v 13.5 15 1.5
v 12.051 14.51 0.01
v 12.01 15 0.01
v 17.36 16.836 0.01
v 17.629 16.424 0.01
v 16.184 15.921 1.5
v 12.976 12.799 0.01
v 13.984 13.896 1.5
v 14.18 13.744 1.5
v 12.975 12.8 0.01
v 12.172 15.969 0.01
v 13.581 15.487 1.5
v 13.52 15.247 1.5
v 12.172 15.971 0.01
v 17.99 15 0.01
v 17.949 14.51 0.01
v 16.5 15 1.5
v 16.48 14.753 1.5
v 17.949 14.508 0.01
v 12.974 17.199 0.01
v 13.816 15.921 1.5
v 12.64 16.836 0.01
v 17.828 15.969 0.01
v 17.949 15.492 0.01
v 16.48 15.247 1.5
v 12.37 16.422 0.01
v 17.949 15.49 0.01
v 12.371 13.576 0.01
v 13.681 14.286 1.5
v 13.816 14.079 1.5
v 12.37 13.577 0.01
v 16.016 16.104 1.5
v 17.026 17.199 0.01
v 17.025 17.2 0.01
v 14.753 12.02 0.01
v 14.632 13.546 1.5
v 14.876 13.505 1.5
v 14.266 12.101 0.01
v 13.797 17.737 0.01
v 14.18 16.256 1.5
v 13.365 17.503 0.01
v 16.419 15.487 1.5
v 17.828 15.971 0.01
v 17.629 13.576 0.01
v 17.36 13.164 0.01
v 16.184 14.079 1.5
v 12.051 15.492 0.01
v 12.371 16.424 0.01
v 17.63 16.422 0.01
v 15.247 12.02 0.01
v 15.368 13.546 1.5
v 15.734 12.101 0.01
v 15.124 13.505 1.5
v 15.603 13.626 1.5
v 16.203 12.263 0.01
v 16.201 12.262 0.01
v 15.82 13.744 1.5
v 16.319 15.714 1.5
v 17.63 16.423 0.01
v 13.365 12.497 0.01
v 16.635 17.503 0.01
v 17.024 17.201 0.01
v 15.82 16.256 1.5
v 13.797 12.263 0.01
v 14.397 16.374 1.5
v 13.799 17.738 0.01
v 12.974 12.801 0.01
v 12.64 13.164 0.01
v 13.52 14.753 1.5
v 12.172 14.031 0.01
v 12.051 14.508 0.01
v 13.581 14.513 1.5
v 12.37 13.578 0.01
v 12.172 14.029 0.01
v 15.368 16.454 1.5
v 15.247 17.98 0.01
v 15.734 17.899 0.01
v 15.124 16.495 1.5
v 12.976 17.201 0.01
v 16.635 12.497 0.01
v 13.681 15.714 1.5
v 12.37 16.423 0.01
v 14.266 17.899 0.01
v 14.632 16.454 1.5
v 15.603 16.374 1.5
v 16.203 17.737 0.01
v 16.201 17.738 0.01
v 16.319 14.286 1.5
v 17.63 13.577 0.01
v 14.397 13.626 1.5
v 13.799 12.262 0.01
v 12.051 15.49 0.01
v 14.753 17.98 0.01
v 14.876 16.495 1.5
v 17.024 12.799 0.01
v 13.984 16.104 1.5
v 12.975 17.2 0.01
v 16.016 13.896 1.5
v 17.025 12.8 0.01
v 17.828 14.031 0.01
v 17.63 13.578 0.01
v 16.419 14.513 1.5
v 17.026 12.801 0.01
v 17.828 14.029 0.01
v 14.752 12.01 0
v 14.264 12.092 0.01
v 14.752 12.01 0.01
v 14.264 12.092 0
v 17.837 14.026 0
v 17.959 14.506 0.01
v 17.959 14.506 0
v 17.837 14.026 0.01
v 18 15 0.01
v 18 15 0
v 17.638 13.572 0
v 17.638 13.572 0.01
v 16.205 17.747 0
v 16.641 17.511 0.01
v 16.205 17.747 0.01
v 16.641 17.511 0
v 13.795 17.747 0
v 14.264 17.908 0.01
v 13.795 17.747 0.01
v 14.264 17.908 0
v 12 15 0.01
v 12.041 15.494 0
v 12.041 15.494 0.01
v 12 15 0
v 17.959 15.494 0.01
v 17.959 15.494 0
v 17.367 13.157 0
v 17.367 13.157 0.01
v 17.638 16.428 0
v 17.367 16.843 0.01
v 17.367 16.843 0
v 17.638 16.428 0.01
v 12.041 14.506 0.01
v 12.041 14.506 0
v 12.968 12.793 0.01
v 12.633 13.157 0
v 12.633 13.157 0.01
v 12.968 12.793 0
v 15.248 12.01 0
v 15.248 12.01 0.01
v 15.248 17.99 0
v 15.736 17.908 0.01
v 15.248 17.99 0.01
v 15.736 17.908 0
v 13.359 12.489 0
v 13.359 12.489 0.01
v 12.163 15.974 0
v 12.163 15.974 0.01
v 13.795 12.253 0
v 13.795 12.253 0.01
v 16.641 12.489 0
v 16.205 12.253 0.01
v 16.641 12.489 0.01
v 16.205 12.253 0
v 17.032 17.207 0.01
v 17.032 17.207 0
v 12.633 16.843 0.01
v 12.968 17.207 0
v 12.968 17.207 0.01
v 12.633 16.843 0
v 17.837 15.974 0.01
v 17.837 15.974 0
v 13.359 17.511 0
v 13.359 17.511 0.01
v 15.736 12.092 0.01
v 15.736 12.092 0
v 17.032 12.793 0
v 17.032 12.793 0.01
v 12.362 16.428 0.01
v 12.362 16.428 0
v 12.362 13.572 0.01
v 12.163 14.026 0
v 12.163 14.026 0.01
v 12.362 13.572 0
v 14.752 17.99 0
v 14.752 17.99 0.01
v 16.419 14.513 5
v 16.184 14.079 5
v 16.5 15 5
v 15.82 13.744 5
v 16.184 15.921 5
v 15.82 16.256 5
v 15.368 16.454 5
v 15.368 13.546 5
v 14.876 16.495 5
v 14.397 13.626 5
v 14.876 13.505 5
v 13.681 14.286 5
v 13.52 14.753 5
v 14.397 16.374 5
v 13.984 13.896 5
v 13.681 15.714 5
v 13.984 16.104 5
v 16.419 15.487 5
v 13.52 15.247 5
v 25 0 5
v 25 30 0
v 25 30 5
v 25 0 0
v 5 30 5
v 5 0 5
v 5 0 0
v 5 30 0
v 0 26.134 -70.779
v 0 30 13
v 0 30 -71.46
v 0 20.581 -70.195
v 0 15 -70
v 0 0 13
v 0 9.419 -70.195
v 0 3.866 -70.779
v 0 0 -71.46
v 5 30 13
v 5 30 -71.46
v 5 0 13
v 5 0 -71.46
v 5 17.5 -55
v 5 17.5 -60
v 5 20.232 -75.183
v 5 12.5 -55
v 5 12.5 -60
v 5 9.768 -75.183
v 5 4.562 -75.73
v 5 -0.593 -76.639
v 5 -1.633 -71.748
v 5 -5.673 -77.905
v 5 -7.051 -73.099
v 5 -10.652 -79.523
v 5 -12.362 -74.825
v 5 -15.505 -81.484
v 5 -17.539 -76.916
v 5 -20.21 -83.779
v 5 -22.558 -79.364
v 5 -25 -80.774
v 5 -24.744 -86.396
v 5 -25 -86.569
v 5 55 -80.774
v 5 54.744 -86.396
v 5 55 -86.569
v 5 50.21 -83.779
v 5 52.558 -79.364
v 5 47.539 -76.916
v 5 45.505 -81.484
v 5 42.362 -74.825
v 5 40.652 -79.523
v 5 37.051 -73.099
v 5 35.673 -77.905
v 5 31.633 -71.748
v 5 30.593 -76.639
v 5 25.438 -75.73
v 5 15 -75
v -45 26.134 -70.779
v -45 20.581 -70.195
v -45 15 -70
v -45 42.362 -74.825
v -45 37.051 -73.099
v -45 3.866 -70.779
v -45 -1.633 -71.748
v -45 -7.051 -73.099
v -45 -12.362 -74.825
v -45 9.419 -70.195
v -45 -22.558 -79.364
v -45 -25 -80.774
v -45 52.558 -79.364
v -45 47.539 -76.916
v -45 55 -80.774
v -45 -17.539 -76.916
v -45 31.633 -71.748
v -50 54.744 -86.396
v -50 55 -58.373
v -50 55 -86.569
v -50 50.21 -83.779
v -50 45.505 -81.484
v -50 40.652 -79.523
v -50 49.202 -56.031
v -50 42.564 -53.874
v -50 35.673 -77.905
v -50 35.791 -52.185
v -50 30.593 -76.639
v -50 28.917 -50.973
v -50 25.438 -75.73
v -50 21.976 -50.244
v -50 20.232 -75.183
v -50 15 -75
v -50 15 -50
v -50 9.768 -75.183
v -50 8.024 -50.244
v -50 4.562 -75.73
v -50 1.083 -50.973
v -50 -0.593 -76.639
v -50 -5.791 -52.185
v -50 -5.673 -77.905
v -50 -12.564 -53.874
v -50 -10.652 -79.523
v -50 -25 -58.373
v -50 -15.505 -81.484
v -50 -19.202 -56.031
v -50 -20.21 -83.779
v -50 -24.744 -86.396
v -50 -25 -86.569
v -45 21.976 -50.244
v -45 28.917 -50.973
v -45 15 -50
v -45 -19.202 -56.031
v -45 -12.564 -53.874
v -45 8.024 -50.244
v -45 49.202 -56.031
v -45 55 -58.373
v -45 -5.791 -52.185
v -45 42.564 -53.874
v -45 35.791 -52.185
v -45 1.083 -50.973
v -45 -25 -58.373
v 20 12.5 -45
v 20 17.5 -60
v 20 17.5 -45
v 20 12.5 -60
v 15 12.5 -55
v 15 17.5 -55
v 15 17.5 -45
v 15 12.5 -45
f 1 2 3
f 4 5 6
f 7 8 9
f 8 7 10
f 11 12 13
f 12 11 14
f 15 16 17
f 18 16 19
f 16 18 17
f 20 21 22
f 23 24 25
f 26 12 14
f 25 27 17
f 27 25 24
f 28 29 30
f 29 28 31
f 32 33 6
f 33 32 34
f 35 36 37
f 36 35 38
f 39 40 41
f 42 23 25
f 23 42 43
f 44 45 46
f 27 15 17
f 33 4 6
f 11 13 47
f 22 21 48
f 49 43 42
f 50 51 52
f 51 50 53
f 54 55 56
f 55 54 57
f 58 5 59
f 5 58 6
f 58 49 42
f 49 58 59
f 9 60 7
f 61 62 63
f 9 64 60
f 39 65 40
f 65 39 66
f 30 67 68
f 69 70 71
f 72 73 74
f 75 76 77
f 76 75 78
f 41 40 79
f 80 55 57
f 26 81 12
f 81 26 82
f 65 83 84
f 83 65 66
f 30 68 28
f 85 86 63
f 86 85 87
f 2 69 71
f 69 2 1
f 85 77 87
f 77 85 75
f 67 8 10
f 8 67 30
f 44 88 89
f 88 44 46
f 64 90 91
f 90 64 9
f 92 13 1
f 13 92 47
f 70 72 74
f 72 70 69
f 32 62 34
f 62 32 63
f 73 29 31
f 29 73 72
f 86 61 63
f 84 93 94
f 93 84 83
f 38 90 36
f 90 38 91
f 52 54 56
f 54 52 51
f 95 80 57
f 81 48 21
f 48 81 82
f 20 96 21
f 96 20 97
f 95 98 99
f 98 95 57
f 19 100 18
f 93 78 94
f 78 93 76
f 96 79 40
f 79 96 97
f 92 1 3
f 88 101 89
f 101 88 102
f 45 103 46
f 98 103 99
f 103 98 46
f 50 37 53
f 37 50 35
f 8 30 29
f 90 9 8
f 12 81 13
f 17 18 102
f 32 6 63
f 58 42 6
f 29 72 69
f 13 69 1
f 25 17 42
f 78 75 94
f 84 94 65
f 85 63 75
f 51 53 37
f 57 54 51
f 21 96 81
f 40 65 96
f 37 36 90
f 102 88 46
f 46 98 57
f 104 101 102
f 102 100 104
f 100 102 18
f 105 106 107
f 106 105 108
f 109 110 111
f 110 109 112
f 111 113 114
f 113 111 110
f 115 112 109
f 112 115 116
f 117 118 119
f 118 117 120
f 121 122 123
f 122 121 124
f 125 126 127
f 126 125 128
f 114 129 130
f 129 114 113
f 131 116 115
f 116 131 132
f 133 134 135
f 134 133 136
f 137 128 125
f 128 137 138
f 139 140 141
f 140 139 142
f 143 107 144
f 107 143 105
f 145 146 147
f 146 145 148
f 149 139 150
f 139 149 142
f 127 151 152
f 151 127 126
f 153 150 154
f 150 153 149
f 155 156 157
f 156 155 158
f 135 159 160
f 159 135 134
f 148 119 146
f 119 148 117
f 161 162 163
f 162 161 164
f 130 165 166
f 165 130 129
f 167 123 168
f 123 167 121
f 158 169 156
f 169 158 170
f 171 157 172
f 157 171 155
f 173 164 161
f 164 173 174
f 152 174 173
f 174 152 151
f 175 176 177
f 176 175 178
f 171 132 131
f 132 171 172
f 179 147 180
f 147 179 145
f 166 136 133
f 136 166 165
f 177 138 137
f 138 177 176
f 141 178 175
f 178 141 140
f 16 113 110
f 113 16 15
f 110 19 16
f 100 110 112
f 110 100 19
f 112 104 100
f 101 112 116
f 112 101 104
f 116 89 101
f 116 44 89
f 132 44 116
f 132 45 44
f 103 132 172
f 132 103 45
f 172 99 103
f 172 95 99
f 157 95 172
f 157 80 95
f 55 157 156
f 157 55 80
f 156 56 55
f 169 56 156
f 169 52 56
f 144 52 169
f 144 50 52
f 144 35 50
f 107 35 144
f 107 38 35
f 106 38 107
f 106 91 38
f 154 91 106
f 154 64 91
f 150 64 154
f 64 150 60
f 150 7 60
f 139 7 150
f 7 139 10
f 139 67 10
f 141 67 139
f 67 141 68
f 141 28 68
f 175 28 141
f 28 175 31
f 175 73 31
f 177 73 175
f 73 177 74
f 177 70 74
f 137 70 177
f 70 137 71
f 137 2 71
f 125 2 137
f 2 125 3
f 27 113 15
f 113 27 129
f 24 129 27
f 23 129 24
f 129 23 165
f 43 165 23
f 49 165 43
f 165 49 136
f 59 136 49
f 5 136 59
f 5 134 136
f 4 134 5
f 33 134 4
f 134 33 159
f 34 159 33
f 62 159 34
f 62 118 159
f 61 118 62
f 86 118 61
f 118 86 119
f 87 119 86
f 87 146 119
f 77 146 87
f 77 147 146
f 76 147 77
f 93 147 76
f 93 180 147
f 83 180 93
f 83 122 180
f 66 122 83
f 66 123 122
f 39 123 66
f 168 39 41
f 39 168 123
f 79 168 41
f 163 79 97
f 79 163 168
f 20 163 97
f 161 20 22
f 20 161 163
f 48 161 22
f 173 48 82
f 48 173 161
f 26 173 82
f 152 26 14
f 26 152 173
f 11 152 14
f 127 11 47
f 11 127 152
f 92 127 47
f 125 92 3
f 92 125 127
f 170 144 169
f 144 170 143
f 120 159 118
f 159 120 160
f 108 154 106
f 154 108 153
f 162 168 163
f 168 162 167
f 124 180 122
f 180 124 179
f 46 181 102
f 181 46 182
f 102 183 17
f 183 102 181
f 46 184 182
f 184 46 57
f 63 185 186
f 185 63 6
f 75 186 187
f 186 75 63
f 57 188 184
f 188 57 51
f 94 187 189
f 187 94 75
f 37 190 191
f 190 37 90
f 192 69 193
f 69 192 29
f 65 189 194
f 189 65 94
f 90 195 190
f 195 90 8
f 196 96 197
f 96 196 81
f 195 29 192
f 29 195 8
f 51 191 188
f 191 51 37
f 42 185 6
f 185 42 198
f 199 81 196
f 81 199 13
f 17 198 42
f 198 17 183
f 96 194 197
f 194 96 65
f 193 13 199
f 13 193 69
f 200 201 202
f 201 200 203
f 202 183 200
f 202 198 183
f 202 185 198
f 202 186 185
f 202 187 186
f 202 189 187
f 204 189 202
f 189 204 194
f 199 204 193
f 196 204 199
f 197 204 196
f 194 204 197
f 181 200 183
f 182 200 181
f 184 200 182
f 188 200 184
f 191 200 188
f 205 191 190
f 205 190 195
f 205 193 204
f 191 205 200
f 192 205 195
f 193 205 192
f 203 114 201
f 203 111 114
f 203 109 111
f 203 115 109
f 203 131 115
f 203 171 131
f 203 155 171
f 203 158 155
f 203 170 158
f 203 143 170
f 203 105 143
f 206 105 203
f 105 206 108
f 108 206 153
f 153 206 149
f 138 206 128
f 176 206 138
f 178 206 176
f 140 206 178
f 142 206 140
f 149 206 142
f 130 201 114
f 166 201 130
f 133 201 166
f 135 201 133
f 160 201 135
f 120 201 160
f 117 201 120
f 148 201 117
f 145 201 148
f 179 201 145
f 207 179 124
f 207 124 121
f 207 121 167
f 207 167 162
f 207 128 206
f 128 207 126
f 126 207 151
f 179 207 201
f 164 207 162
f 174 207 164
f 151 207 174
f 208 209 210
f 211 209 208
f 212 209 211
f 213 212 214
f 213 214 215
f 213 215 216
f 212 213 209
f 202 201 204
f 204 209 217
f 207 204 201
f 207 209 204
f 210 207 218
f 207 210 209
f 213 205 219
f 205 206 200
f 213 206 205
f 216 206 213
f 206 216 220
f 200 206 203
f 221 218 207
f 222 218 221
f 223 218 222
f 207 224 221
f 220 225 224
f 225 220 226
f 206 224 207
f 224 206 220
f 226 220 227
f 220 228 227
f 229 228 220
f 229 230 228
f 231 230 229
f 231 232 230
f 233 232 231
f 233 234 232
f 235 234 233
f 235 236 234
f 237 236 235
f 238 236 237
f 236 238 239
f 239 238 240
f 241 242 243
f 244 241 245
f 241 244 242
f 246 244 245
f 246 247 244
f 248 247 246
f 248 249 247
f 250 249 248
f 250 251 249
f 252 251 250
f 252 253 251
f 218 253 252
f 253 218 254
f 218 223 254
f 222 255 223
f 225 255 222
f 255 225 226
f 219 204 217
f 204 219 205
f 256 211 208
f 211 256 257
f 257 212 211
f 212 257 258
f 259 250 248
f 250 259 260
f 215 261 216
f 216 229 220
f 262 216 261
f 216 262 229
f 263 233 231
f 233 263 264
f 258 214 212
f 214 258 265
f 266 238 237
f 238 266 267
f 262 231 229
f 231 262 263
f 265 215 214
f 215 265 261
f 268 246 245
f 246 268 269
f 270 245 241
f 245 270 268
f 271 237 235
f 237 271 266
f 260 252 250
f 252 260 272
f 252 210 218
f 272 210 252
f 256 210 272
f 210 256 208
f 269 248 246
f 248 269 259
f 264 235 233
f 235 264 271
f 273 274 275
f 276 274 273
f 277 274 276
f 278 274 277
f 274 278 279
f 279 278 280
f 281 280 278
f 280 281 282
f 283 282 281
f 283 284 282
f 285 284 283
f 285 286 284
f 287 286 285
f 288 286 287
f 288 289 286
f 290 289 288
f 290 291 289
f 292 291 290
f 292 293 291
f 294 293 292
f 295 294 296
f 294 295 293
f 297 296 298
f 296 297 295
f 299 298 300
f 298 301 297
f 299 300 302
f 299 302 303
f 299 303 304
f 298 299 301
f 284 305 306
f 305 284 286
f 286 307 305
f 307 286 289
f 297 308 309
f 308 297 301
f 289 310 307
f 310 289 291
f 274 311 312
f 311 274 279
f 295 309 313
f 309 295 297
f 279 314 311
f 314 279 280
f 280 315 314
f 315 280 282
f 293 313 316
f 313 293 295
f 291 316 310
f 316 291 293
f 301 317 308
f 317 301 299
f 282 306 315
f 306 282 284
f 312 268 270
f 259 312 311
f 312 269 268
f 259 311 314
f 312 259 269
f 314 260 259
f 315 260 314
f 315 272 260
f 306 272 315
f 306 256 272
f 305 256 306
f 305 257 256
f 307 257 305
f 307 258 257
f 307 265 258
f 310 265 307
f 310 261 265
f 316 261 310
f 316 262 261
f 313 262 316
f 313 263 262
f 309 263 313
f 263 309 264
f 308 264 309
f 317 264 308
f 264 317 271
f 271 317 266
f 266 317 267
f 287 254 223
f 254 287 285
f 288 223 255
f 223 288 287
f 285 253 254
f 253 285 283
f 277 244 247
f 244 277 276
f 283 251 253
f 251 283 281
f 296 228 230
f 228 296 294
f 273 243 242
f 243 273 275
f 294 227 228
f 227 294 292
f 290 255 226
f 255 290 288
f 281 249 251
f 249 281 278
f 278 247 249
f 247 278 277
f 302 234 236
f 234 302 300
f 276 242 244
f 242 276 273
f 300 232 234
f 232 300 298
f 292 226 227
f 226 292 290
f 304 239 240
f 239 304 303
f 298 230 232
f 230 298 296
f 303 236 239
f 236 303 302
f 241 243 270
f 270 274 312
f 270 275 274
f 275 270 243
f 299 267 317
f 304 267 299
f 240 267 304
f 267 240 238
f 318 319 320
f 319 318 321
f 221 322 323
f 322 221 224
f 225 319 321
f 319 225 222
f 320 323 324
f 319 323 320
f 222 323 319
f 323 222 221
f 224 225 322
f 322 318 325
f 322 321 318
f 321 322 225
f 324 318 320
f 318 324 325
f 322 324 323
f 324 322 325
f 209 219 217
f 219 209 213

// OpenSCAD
thickness = 5;
width = 30;
length = 80;
alignerHeight = 8;
screwPlateWidth = 20;

armRadius = 75;
armWidth = 45;
armRailHeight = 20;
armBBWidth = 80;
armBBHeight = 50;

hookWidth = 10;
hookHeight = 10;

$fa = 4;
$fs = 0.5;  

module screwHole() {
    // 3.0 x 20 mm
    screwRadius = 1.5;
    screwHeadRadius = 3;
    screwHeadHeight = 1.5;
    
    length = 100;
    translate([0, 0, -screwHeadHeight])
        cylinder(screwHeadHeight, screwRadius, screwHeadRadius);
    translate([0, 0, -0.01])
        cylinder(length, screwHeadRadius, screwHeadRadius);
    cylinder(length, screwRadius, screwRadius, true);
}

difference() {    
    cube([thickness + screwPlateWidth, width, thickness]);
    translate([thickness + screwPlateWidth / 2, width / 2, 0])
    rotate([180, 0, 0])
        screwHole();
}
cube([thickness, width, thickness + alignerHeight]);

difference() {
    translate([0, 0, -length])
        cube([thickness, width, length]);
    rotate([0, -90, 0])
    translate([-armRadius - length + thickness, width / 2, 0])
    cylinder(armWidth * 4, armRadius, armRadius, true);
}

// Arm
intersection() {
    rotate([0, -90, 0])
    translate([-armRadius - length + thickness, width / 2, -thickness]) {
        difference() {
            union() {
                cylinder(armWidth + 2 * thickness, armRadius + thickness, armRadius + thickness);
                translate([0, 0, armWidth + thickness])
                cylinder(thickness, armRadius + thickness + armRailHeight, armRadius + thickness + armRailHeight);
            }
            cylinder(armWidth * 4, armRadius, armRadius, true);
        }
    }
    translate([-armWidth - thickness, (width - armBBWidth) / 2, -length - armBBHeight + 2 * thickness + armRailHeight])
        cube([armWidth * 2, armBBWidth, armBBHeight]);
}

// Hook
translate([thickness, (width - thickness) / 2, -length * 0.75]) {
    cube([thickness + hookWidth, thickness, thickness]);
    translate([hookWidth, 0, thickness])
        cube([thickness, thickness, hookHeight]);
}
